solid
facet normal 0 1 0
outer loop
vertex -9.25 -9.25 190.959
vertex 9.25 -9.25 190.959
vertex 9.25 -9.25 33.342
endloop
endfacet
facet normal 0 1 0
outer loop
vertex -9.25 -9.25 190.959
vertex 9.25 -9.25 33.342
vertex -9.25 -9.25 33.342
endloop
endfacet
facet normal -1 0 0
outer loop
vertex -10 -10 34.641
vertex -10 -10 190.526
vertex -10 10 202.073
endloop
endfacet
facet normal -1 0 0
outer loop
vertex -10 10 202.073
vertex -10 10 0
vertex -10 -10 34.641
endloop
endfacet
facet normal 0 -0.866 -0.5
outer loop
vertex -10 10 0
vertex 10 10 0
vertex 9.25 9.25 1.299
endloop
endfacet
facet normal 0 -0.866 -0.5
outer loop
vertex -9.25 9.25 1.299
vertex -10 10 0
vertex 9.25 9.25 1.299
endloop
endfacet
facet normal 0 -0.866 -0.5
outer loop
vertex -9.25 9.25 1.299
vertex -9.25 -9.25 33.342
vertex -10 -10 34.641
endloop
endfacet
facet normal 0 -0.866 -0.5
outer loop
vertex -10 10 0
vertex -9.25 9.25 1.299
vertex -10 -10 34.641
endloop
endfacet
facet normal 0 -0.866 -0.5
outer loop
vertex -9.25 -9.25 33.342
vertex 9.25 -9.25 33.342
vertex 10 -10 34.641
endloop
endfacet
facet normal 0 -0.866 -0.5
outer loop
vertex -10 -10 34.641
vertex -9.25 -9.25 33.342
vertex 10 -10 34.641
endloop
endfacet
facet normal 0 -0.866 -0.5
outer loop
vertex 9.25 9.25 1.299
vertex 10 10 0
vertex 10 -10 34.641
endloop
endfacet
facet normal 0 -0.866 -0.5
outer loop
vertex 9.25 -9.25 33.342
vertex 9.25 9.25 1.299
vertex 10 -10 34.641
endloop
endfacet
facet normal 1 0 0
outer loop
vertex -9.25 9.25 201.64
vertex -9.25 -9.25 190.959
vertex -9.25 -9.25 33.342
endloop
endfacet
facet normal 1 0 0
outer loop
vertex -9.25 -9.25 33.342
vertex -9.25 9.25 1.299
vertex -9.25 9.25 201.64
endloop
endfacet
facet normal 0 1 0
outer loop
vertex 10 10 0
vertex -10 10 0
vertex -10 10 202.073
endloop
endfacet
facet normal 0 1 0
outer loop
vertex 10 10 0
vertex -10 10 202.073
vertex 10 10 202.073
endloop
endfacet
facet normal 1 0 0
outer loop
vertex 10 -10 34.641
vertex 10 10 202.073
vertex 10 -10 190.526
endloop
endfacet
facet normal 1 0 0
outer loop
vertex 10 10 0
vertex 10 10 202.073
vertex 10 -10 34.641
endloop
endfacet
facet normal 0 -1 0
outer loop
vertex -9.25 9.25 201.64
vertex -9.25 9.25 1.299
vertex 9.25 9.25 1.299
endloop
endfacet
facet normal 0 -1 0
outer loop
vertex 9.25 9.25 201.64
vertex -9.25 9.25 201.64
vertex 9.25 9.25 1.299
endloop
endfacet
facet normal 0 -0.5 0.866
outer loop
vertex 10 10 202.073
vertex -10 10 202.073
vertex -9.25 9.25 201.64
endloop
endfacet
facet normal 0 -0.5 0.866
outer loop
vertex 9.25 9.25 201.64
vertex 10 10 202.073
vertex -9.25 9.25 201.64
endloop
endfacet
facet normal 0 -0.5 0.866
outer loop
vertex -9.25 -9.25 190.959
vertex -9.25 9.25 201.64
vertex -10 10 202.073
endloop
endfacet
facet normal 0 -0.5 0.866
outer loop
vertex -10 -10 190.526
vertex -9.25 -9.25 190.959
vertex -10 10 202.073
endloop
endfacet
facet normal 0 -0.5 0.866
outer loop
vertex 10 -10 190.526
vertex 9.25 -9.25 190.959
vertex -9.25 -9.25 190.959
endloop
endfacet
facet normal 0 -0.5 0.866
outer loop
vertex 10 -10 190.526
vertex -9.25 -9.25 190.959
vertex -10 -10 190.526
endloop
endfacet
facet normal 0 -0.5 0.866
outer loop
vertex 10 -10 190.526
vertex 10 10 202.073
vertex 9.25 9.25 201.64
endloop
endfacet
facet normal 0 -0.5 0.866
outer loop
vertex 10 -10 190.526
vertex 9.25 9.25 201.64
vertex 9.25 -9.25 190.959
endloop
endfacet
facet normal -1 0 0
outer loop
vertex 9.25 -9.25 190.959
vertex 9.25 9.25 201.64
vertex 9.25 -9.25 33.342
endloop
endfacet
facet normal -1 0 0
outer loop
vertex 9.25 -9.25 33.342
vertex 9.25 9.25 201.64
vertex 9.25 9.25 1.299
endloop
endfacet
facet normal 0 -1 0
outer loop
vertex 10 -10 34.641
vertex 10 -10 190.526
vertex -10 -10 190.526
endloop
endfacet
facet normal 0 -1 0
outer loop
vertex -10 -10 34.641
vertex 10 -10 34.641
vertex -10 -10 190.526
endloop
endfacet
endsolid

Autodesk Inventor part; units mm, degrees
ref_plane "YZ Plane" through (0, 0, 0) normal (1, 0, 0) x (0, 1, 0)
ref_plane "XZ Plane" through (0, 0, 0) normal (0, 1, 0) x (-1, 0, 0)
ref_plane "XY Plane" through (0, 0, 0) normal (0, 0, 1) x (1, 0, 0)
sketch "Эскиз1" plane through (0, 0, 0) normal (0, 0, 1) x (1, 0, 0)
  line L0 (10, -10) -> (-10, -10)
  line L1 (-10, -10) -> (-10, 10)
  line L2 (-10, 10) -> (10, 10)
  line L3 (10, 10) -> (10, -10)
  line L4 (10, -10) -> (-10, 10) construction
  line L5 (-10, -10) -> (10, 10) construction
  line L6 (9.25, -9.25) -> (-9.25, -9.25)
  line L7 (-9.25, -9.25) -> (-9.25, 9.25)
  line L8 (-9.25, 9.25) -> (9.25, 9.25)
  line L9 (9.25, 9.25) -> (9.25, -9.25)
  line L10 (9.25, -9.25) -> (-9.25, 9.25) construction
  line L11 (-9.25, -9.25) -> (9.25, 9.25) construction
  point P0 (0, 0)
  dimension "d0" = 20
  dimension "d1" = 20
  dimension "d2" = 18.5
  dimension "d3" = 18.5
extrude "Выдавливание1" add sketch "Эскиз1" along normal blind 202.0726
sketch "Эскиз2" plane through (10, -10, 0) normal (1, 0, 0) x (0, 0, -1)
  line L0 (0, 0) -> (0, 20) projected
  line L1 (0, 20) -> (-34.641, 0)
  line L2 (0, 0) -> (-202.0726, 0) projected
  line L3 (0, 20) -> (40, 20) construction
  line L4 (-34.641, 0) -> (0, 0)
  line L5 (0, 0) -> (0, 20)
  point P0 (0, 10)
  dimension "d6" = 150
extrude "Выдавливание2" cut sketch "Эскиз2" against normal blind 178.9786
sketch "Эскиз3" plane through (10, -10, 202.0726) normal (1, 0, 0) x (0, 0, -1)
  line L0 (0, 20) -> (11.547, 0)
  line L1 (167.4316, 0) -> (0, 0) projected
  line L2 (0, 20) -> (23.094, 20) construction
  line L3 (11.547, 0) -> (0, 0)
  line L4 (0, 0) -> (0, 20) projected
  line L5 (0, 0) -> (0, 20)
  point P0 (202.0726, 10)
  dimension "d9" = 60
extrude "Выдавливание3" cut sketch "Эскиз3" against normal blind 202.0726
